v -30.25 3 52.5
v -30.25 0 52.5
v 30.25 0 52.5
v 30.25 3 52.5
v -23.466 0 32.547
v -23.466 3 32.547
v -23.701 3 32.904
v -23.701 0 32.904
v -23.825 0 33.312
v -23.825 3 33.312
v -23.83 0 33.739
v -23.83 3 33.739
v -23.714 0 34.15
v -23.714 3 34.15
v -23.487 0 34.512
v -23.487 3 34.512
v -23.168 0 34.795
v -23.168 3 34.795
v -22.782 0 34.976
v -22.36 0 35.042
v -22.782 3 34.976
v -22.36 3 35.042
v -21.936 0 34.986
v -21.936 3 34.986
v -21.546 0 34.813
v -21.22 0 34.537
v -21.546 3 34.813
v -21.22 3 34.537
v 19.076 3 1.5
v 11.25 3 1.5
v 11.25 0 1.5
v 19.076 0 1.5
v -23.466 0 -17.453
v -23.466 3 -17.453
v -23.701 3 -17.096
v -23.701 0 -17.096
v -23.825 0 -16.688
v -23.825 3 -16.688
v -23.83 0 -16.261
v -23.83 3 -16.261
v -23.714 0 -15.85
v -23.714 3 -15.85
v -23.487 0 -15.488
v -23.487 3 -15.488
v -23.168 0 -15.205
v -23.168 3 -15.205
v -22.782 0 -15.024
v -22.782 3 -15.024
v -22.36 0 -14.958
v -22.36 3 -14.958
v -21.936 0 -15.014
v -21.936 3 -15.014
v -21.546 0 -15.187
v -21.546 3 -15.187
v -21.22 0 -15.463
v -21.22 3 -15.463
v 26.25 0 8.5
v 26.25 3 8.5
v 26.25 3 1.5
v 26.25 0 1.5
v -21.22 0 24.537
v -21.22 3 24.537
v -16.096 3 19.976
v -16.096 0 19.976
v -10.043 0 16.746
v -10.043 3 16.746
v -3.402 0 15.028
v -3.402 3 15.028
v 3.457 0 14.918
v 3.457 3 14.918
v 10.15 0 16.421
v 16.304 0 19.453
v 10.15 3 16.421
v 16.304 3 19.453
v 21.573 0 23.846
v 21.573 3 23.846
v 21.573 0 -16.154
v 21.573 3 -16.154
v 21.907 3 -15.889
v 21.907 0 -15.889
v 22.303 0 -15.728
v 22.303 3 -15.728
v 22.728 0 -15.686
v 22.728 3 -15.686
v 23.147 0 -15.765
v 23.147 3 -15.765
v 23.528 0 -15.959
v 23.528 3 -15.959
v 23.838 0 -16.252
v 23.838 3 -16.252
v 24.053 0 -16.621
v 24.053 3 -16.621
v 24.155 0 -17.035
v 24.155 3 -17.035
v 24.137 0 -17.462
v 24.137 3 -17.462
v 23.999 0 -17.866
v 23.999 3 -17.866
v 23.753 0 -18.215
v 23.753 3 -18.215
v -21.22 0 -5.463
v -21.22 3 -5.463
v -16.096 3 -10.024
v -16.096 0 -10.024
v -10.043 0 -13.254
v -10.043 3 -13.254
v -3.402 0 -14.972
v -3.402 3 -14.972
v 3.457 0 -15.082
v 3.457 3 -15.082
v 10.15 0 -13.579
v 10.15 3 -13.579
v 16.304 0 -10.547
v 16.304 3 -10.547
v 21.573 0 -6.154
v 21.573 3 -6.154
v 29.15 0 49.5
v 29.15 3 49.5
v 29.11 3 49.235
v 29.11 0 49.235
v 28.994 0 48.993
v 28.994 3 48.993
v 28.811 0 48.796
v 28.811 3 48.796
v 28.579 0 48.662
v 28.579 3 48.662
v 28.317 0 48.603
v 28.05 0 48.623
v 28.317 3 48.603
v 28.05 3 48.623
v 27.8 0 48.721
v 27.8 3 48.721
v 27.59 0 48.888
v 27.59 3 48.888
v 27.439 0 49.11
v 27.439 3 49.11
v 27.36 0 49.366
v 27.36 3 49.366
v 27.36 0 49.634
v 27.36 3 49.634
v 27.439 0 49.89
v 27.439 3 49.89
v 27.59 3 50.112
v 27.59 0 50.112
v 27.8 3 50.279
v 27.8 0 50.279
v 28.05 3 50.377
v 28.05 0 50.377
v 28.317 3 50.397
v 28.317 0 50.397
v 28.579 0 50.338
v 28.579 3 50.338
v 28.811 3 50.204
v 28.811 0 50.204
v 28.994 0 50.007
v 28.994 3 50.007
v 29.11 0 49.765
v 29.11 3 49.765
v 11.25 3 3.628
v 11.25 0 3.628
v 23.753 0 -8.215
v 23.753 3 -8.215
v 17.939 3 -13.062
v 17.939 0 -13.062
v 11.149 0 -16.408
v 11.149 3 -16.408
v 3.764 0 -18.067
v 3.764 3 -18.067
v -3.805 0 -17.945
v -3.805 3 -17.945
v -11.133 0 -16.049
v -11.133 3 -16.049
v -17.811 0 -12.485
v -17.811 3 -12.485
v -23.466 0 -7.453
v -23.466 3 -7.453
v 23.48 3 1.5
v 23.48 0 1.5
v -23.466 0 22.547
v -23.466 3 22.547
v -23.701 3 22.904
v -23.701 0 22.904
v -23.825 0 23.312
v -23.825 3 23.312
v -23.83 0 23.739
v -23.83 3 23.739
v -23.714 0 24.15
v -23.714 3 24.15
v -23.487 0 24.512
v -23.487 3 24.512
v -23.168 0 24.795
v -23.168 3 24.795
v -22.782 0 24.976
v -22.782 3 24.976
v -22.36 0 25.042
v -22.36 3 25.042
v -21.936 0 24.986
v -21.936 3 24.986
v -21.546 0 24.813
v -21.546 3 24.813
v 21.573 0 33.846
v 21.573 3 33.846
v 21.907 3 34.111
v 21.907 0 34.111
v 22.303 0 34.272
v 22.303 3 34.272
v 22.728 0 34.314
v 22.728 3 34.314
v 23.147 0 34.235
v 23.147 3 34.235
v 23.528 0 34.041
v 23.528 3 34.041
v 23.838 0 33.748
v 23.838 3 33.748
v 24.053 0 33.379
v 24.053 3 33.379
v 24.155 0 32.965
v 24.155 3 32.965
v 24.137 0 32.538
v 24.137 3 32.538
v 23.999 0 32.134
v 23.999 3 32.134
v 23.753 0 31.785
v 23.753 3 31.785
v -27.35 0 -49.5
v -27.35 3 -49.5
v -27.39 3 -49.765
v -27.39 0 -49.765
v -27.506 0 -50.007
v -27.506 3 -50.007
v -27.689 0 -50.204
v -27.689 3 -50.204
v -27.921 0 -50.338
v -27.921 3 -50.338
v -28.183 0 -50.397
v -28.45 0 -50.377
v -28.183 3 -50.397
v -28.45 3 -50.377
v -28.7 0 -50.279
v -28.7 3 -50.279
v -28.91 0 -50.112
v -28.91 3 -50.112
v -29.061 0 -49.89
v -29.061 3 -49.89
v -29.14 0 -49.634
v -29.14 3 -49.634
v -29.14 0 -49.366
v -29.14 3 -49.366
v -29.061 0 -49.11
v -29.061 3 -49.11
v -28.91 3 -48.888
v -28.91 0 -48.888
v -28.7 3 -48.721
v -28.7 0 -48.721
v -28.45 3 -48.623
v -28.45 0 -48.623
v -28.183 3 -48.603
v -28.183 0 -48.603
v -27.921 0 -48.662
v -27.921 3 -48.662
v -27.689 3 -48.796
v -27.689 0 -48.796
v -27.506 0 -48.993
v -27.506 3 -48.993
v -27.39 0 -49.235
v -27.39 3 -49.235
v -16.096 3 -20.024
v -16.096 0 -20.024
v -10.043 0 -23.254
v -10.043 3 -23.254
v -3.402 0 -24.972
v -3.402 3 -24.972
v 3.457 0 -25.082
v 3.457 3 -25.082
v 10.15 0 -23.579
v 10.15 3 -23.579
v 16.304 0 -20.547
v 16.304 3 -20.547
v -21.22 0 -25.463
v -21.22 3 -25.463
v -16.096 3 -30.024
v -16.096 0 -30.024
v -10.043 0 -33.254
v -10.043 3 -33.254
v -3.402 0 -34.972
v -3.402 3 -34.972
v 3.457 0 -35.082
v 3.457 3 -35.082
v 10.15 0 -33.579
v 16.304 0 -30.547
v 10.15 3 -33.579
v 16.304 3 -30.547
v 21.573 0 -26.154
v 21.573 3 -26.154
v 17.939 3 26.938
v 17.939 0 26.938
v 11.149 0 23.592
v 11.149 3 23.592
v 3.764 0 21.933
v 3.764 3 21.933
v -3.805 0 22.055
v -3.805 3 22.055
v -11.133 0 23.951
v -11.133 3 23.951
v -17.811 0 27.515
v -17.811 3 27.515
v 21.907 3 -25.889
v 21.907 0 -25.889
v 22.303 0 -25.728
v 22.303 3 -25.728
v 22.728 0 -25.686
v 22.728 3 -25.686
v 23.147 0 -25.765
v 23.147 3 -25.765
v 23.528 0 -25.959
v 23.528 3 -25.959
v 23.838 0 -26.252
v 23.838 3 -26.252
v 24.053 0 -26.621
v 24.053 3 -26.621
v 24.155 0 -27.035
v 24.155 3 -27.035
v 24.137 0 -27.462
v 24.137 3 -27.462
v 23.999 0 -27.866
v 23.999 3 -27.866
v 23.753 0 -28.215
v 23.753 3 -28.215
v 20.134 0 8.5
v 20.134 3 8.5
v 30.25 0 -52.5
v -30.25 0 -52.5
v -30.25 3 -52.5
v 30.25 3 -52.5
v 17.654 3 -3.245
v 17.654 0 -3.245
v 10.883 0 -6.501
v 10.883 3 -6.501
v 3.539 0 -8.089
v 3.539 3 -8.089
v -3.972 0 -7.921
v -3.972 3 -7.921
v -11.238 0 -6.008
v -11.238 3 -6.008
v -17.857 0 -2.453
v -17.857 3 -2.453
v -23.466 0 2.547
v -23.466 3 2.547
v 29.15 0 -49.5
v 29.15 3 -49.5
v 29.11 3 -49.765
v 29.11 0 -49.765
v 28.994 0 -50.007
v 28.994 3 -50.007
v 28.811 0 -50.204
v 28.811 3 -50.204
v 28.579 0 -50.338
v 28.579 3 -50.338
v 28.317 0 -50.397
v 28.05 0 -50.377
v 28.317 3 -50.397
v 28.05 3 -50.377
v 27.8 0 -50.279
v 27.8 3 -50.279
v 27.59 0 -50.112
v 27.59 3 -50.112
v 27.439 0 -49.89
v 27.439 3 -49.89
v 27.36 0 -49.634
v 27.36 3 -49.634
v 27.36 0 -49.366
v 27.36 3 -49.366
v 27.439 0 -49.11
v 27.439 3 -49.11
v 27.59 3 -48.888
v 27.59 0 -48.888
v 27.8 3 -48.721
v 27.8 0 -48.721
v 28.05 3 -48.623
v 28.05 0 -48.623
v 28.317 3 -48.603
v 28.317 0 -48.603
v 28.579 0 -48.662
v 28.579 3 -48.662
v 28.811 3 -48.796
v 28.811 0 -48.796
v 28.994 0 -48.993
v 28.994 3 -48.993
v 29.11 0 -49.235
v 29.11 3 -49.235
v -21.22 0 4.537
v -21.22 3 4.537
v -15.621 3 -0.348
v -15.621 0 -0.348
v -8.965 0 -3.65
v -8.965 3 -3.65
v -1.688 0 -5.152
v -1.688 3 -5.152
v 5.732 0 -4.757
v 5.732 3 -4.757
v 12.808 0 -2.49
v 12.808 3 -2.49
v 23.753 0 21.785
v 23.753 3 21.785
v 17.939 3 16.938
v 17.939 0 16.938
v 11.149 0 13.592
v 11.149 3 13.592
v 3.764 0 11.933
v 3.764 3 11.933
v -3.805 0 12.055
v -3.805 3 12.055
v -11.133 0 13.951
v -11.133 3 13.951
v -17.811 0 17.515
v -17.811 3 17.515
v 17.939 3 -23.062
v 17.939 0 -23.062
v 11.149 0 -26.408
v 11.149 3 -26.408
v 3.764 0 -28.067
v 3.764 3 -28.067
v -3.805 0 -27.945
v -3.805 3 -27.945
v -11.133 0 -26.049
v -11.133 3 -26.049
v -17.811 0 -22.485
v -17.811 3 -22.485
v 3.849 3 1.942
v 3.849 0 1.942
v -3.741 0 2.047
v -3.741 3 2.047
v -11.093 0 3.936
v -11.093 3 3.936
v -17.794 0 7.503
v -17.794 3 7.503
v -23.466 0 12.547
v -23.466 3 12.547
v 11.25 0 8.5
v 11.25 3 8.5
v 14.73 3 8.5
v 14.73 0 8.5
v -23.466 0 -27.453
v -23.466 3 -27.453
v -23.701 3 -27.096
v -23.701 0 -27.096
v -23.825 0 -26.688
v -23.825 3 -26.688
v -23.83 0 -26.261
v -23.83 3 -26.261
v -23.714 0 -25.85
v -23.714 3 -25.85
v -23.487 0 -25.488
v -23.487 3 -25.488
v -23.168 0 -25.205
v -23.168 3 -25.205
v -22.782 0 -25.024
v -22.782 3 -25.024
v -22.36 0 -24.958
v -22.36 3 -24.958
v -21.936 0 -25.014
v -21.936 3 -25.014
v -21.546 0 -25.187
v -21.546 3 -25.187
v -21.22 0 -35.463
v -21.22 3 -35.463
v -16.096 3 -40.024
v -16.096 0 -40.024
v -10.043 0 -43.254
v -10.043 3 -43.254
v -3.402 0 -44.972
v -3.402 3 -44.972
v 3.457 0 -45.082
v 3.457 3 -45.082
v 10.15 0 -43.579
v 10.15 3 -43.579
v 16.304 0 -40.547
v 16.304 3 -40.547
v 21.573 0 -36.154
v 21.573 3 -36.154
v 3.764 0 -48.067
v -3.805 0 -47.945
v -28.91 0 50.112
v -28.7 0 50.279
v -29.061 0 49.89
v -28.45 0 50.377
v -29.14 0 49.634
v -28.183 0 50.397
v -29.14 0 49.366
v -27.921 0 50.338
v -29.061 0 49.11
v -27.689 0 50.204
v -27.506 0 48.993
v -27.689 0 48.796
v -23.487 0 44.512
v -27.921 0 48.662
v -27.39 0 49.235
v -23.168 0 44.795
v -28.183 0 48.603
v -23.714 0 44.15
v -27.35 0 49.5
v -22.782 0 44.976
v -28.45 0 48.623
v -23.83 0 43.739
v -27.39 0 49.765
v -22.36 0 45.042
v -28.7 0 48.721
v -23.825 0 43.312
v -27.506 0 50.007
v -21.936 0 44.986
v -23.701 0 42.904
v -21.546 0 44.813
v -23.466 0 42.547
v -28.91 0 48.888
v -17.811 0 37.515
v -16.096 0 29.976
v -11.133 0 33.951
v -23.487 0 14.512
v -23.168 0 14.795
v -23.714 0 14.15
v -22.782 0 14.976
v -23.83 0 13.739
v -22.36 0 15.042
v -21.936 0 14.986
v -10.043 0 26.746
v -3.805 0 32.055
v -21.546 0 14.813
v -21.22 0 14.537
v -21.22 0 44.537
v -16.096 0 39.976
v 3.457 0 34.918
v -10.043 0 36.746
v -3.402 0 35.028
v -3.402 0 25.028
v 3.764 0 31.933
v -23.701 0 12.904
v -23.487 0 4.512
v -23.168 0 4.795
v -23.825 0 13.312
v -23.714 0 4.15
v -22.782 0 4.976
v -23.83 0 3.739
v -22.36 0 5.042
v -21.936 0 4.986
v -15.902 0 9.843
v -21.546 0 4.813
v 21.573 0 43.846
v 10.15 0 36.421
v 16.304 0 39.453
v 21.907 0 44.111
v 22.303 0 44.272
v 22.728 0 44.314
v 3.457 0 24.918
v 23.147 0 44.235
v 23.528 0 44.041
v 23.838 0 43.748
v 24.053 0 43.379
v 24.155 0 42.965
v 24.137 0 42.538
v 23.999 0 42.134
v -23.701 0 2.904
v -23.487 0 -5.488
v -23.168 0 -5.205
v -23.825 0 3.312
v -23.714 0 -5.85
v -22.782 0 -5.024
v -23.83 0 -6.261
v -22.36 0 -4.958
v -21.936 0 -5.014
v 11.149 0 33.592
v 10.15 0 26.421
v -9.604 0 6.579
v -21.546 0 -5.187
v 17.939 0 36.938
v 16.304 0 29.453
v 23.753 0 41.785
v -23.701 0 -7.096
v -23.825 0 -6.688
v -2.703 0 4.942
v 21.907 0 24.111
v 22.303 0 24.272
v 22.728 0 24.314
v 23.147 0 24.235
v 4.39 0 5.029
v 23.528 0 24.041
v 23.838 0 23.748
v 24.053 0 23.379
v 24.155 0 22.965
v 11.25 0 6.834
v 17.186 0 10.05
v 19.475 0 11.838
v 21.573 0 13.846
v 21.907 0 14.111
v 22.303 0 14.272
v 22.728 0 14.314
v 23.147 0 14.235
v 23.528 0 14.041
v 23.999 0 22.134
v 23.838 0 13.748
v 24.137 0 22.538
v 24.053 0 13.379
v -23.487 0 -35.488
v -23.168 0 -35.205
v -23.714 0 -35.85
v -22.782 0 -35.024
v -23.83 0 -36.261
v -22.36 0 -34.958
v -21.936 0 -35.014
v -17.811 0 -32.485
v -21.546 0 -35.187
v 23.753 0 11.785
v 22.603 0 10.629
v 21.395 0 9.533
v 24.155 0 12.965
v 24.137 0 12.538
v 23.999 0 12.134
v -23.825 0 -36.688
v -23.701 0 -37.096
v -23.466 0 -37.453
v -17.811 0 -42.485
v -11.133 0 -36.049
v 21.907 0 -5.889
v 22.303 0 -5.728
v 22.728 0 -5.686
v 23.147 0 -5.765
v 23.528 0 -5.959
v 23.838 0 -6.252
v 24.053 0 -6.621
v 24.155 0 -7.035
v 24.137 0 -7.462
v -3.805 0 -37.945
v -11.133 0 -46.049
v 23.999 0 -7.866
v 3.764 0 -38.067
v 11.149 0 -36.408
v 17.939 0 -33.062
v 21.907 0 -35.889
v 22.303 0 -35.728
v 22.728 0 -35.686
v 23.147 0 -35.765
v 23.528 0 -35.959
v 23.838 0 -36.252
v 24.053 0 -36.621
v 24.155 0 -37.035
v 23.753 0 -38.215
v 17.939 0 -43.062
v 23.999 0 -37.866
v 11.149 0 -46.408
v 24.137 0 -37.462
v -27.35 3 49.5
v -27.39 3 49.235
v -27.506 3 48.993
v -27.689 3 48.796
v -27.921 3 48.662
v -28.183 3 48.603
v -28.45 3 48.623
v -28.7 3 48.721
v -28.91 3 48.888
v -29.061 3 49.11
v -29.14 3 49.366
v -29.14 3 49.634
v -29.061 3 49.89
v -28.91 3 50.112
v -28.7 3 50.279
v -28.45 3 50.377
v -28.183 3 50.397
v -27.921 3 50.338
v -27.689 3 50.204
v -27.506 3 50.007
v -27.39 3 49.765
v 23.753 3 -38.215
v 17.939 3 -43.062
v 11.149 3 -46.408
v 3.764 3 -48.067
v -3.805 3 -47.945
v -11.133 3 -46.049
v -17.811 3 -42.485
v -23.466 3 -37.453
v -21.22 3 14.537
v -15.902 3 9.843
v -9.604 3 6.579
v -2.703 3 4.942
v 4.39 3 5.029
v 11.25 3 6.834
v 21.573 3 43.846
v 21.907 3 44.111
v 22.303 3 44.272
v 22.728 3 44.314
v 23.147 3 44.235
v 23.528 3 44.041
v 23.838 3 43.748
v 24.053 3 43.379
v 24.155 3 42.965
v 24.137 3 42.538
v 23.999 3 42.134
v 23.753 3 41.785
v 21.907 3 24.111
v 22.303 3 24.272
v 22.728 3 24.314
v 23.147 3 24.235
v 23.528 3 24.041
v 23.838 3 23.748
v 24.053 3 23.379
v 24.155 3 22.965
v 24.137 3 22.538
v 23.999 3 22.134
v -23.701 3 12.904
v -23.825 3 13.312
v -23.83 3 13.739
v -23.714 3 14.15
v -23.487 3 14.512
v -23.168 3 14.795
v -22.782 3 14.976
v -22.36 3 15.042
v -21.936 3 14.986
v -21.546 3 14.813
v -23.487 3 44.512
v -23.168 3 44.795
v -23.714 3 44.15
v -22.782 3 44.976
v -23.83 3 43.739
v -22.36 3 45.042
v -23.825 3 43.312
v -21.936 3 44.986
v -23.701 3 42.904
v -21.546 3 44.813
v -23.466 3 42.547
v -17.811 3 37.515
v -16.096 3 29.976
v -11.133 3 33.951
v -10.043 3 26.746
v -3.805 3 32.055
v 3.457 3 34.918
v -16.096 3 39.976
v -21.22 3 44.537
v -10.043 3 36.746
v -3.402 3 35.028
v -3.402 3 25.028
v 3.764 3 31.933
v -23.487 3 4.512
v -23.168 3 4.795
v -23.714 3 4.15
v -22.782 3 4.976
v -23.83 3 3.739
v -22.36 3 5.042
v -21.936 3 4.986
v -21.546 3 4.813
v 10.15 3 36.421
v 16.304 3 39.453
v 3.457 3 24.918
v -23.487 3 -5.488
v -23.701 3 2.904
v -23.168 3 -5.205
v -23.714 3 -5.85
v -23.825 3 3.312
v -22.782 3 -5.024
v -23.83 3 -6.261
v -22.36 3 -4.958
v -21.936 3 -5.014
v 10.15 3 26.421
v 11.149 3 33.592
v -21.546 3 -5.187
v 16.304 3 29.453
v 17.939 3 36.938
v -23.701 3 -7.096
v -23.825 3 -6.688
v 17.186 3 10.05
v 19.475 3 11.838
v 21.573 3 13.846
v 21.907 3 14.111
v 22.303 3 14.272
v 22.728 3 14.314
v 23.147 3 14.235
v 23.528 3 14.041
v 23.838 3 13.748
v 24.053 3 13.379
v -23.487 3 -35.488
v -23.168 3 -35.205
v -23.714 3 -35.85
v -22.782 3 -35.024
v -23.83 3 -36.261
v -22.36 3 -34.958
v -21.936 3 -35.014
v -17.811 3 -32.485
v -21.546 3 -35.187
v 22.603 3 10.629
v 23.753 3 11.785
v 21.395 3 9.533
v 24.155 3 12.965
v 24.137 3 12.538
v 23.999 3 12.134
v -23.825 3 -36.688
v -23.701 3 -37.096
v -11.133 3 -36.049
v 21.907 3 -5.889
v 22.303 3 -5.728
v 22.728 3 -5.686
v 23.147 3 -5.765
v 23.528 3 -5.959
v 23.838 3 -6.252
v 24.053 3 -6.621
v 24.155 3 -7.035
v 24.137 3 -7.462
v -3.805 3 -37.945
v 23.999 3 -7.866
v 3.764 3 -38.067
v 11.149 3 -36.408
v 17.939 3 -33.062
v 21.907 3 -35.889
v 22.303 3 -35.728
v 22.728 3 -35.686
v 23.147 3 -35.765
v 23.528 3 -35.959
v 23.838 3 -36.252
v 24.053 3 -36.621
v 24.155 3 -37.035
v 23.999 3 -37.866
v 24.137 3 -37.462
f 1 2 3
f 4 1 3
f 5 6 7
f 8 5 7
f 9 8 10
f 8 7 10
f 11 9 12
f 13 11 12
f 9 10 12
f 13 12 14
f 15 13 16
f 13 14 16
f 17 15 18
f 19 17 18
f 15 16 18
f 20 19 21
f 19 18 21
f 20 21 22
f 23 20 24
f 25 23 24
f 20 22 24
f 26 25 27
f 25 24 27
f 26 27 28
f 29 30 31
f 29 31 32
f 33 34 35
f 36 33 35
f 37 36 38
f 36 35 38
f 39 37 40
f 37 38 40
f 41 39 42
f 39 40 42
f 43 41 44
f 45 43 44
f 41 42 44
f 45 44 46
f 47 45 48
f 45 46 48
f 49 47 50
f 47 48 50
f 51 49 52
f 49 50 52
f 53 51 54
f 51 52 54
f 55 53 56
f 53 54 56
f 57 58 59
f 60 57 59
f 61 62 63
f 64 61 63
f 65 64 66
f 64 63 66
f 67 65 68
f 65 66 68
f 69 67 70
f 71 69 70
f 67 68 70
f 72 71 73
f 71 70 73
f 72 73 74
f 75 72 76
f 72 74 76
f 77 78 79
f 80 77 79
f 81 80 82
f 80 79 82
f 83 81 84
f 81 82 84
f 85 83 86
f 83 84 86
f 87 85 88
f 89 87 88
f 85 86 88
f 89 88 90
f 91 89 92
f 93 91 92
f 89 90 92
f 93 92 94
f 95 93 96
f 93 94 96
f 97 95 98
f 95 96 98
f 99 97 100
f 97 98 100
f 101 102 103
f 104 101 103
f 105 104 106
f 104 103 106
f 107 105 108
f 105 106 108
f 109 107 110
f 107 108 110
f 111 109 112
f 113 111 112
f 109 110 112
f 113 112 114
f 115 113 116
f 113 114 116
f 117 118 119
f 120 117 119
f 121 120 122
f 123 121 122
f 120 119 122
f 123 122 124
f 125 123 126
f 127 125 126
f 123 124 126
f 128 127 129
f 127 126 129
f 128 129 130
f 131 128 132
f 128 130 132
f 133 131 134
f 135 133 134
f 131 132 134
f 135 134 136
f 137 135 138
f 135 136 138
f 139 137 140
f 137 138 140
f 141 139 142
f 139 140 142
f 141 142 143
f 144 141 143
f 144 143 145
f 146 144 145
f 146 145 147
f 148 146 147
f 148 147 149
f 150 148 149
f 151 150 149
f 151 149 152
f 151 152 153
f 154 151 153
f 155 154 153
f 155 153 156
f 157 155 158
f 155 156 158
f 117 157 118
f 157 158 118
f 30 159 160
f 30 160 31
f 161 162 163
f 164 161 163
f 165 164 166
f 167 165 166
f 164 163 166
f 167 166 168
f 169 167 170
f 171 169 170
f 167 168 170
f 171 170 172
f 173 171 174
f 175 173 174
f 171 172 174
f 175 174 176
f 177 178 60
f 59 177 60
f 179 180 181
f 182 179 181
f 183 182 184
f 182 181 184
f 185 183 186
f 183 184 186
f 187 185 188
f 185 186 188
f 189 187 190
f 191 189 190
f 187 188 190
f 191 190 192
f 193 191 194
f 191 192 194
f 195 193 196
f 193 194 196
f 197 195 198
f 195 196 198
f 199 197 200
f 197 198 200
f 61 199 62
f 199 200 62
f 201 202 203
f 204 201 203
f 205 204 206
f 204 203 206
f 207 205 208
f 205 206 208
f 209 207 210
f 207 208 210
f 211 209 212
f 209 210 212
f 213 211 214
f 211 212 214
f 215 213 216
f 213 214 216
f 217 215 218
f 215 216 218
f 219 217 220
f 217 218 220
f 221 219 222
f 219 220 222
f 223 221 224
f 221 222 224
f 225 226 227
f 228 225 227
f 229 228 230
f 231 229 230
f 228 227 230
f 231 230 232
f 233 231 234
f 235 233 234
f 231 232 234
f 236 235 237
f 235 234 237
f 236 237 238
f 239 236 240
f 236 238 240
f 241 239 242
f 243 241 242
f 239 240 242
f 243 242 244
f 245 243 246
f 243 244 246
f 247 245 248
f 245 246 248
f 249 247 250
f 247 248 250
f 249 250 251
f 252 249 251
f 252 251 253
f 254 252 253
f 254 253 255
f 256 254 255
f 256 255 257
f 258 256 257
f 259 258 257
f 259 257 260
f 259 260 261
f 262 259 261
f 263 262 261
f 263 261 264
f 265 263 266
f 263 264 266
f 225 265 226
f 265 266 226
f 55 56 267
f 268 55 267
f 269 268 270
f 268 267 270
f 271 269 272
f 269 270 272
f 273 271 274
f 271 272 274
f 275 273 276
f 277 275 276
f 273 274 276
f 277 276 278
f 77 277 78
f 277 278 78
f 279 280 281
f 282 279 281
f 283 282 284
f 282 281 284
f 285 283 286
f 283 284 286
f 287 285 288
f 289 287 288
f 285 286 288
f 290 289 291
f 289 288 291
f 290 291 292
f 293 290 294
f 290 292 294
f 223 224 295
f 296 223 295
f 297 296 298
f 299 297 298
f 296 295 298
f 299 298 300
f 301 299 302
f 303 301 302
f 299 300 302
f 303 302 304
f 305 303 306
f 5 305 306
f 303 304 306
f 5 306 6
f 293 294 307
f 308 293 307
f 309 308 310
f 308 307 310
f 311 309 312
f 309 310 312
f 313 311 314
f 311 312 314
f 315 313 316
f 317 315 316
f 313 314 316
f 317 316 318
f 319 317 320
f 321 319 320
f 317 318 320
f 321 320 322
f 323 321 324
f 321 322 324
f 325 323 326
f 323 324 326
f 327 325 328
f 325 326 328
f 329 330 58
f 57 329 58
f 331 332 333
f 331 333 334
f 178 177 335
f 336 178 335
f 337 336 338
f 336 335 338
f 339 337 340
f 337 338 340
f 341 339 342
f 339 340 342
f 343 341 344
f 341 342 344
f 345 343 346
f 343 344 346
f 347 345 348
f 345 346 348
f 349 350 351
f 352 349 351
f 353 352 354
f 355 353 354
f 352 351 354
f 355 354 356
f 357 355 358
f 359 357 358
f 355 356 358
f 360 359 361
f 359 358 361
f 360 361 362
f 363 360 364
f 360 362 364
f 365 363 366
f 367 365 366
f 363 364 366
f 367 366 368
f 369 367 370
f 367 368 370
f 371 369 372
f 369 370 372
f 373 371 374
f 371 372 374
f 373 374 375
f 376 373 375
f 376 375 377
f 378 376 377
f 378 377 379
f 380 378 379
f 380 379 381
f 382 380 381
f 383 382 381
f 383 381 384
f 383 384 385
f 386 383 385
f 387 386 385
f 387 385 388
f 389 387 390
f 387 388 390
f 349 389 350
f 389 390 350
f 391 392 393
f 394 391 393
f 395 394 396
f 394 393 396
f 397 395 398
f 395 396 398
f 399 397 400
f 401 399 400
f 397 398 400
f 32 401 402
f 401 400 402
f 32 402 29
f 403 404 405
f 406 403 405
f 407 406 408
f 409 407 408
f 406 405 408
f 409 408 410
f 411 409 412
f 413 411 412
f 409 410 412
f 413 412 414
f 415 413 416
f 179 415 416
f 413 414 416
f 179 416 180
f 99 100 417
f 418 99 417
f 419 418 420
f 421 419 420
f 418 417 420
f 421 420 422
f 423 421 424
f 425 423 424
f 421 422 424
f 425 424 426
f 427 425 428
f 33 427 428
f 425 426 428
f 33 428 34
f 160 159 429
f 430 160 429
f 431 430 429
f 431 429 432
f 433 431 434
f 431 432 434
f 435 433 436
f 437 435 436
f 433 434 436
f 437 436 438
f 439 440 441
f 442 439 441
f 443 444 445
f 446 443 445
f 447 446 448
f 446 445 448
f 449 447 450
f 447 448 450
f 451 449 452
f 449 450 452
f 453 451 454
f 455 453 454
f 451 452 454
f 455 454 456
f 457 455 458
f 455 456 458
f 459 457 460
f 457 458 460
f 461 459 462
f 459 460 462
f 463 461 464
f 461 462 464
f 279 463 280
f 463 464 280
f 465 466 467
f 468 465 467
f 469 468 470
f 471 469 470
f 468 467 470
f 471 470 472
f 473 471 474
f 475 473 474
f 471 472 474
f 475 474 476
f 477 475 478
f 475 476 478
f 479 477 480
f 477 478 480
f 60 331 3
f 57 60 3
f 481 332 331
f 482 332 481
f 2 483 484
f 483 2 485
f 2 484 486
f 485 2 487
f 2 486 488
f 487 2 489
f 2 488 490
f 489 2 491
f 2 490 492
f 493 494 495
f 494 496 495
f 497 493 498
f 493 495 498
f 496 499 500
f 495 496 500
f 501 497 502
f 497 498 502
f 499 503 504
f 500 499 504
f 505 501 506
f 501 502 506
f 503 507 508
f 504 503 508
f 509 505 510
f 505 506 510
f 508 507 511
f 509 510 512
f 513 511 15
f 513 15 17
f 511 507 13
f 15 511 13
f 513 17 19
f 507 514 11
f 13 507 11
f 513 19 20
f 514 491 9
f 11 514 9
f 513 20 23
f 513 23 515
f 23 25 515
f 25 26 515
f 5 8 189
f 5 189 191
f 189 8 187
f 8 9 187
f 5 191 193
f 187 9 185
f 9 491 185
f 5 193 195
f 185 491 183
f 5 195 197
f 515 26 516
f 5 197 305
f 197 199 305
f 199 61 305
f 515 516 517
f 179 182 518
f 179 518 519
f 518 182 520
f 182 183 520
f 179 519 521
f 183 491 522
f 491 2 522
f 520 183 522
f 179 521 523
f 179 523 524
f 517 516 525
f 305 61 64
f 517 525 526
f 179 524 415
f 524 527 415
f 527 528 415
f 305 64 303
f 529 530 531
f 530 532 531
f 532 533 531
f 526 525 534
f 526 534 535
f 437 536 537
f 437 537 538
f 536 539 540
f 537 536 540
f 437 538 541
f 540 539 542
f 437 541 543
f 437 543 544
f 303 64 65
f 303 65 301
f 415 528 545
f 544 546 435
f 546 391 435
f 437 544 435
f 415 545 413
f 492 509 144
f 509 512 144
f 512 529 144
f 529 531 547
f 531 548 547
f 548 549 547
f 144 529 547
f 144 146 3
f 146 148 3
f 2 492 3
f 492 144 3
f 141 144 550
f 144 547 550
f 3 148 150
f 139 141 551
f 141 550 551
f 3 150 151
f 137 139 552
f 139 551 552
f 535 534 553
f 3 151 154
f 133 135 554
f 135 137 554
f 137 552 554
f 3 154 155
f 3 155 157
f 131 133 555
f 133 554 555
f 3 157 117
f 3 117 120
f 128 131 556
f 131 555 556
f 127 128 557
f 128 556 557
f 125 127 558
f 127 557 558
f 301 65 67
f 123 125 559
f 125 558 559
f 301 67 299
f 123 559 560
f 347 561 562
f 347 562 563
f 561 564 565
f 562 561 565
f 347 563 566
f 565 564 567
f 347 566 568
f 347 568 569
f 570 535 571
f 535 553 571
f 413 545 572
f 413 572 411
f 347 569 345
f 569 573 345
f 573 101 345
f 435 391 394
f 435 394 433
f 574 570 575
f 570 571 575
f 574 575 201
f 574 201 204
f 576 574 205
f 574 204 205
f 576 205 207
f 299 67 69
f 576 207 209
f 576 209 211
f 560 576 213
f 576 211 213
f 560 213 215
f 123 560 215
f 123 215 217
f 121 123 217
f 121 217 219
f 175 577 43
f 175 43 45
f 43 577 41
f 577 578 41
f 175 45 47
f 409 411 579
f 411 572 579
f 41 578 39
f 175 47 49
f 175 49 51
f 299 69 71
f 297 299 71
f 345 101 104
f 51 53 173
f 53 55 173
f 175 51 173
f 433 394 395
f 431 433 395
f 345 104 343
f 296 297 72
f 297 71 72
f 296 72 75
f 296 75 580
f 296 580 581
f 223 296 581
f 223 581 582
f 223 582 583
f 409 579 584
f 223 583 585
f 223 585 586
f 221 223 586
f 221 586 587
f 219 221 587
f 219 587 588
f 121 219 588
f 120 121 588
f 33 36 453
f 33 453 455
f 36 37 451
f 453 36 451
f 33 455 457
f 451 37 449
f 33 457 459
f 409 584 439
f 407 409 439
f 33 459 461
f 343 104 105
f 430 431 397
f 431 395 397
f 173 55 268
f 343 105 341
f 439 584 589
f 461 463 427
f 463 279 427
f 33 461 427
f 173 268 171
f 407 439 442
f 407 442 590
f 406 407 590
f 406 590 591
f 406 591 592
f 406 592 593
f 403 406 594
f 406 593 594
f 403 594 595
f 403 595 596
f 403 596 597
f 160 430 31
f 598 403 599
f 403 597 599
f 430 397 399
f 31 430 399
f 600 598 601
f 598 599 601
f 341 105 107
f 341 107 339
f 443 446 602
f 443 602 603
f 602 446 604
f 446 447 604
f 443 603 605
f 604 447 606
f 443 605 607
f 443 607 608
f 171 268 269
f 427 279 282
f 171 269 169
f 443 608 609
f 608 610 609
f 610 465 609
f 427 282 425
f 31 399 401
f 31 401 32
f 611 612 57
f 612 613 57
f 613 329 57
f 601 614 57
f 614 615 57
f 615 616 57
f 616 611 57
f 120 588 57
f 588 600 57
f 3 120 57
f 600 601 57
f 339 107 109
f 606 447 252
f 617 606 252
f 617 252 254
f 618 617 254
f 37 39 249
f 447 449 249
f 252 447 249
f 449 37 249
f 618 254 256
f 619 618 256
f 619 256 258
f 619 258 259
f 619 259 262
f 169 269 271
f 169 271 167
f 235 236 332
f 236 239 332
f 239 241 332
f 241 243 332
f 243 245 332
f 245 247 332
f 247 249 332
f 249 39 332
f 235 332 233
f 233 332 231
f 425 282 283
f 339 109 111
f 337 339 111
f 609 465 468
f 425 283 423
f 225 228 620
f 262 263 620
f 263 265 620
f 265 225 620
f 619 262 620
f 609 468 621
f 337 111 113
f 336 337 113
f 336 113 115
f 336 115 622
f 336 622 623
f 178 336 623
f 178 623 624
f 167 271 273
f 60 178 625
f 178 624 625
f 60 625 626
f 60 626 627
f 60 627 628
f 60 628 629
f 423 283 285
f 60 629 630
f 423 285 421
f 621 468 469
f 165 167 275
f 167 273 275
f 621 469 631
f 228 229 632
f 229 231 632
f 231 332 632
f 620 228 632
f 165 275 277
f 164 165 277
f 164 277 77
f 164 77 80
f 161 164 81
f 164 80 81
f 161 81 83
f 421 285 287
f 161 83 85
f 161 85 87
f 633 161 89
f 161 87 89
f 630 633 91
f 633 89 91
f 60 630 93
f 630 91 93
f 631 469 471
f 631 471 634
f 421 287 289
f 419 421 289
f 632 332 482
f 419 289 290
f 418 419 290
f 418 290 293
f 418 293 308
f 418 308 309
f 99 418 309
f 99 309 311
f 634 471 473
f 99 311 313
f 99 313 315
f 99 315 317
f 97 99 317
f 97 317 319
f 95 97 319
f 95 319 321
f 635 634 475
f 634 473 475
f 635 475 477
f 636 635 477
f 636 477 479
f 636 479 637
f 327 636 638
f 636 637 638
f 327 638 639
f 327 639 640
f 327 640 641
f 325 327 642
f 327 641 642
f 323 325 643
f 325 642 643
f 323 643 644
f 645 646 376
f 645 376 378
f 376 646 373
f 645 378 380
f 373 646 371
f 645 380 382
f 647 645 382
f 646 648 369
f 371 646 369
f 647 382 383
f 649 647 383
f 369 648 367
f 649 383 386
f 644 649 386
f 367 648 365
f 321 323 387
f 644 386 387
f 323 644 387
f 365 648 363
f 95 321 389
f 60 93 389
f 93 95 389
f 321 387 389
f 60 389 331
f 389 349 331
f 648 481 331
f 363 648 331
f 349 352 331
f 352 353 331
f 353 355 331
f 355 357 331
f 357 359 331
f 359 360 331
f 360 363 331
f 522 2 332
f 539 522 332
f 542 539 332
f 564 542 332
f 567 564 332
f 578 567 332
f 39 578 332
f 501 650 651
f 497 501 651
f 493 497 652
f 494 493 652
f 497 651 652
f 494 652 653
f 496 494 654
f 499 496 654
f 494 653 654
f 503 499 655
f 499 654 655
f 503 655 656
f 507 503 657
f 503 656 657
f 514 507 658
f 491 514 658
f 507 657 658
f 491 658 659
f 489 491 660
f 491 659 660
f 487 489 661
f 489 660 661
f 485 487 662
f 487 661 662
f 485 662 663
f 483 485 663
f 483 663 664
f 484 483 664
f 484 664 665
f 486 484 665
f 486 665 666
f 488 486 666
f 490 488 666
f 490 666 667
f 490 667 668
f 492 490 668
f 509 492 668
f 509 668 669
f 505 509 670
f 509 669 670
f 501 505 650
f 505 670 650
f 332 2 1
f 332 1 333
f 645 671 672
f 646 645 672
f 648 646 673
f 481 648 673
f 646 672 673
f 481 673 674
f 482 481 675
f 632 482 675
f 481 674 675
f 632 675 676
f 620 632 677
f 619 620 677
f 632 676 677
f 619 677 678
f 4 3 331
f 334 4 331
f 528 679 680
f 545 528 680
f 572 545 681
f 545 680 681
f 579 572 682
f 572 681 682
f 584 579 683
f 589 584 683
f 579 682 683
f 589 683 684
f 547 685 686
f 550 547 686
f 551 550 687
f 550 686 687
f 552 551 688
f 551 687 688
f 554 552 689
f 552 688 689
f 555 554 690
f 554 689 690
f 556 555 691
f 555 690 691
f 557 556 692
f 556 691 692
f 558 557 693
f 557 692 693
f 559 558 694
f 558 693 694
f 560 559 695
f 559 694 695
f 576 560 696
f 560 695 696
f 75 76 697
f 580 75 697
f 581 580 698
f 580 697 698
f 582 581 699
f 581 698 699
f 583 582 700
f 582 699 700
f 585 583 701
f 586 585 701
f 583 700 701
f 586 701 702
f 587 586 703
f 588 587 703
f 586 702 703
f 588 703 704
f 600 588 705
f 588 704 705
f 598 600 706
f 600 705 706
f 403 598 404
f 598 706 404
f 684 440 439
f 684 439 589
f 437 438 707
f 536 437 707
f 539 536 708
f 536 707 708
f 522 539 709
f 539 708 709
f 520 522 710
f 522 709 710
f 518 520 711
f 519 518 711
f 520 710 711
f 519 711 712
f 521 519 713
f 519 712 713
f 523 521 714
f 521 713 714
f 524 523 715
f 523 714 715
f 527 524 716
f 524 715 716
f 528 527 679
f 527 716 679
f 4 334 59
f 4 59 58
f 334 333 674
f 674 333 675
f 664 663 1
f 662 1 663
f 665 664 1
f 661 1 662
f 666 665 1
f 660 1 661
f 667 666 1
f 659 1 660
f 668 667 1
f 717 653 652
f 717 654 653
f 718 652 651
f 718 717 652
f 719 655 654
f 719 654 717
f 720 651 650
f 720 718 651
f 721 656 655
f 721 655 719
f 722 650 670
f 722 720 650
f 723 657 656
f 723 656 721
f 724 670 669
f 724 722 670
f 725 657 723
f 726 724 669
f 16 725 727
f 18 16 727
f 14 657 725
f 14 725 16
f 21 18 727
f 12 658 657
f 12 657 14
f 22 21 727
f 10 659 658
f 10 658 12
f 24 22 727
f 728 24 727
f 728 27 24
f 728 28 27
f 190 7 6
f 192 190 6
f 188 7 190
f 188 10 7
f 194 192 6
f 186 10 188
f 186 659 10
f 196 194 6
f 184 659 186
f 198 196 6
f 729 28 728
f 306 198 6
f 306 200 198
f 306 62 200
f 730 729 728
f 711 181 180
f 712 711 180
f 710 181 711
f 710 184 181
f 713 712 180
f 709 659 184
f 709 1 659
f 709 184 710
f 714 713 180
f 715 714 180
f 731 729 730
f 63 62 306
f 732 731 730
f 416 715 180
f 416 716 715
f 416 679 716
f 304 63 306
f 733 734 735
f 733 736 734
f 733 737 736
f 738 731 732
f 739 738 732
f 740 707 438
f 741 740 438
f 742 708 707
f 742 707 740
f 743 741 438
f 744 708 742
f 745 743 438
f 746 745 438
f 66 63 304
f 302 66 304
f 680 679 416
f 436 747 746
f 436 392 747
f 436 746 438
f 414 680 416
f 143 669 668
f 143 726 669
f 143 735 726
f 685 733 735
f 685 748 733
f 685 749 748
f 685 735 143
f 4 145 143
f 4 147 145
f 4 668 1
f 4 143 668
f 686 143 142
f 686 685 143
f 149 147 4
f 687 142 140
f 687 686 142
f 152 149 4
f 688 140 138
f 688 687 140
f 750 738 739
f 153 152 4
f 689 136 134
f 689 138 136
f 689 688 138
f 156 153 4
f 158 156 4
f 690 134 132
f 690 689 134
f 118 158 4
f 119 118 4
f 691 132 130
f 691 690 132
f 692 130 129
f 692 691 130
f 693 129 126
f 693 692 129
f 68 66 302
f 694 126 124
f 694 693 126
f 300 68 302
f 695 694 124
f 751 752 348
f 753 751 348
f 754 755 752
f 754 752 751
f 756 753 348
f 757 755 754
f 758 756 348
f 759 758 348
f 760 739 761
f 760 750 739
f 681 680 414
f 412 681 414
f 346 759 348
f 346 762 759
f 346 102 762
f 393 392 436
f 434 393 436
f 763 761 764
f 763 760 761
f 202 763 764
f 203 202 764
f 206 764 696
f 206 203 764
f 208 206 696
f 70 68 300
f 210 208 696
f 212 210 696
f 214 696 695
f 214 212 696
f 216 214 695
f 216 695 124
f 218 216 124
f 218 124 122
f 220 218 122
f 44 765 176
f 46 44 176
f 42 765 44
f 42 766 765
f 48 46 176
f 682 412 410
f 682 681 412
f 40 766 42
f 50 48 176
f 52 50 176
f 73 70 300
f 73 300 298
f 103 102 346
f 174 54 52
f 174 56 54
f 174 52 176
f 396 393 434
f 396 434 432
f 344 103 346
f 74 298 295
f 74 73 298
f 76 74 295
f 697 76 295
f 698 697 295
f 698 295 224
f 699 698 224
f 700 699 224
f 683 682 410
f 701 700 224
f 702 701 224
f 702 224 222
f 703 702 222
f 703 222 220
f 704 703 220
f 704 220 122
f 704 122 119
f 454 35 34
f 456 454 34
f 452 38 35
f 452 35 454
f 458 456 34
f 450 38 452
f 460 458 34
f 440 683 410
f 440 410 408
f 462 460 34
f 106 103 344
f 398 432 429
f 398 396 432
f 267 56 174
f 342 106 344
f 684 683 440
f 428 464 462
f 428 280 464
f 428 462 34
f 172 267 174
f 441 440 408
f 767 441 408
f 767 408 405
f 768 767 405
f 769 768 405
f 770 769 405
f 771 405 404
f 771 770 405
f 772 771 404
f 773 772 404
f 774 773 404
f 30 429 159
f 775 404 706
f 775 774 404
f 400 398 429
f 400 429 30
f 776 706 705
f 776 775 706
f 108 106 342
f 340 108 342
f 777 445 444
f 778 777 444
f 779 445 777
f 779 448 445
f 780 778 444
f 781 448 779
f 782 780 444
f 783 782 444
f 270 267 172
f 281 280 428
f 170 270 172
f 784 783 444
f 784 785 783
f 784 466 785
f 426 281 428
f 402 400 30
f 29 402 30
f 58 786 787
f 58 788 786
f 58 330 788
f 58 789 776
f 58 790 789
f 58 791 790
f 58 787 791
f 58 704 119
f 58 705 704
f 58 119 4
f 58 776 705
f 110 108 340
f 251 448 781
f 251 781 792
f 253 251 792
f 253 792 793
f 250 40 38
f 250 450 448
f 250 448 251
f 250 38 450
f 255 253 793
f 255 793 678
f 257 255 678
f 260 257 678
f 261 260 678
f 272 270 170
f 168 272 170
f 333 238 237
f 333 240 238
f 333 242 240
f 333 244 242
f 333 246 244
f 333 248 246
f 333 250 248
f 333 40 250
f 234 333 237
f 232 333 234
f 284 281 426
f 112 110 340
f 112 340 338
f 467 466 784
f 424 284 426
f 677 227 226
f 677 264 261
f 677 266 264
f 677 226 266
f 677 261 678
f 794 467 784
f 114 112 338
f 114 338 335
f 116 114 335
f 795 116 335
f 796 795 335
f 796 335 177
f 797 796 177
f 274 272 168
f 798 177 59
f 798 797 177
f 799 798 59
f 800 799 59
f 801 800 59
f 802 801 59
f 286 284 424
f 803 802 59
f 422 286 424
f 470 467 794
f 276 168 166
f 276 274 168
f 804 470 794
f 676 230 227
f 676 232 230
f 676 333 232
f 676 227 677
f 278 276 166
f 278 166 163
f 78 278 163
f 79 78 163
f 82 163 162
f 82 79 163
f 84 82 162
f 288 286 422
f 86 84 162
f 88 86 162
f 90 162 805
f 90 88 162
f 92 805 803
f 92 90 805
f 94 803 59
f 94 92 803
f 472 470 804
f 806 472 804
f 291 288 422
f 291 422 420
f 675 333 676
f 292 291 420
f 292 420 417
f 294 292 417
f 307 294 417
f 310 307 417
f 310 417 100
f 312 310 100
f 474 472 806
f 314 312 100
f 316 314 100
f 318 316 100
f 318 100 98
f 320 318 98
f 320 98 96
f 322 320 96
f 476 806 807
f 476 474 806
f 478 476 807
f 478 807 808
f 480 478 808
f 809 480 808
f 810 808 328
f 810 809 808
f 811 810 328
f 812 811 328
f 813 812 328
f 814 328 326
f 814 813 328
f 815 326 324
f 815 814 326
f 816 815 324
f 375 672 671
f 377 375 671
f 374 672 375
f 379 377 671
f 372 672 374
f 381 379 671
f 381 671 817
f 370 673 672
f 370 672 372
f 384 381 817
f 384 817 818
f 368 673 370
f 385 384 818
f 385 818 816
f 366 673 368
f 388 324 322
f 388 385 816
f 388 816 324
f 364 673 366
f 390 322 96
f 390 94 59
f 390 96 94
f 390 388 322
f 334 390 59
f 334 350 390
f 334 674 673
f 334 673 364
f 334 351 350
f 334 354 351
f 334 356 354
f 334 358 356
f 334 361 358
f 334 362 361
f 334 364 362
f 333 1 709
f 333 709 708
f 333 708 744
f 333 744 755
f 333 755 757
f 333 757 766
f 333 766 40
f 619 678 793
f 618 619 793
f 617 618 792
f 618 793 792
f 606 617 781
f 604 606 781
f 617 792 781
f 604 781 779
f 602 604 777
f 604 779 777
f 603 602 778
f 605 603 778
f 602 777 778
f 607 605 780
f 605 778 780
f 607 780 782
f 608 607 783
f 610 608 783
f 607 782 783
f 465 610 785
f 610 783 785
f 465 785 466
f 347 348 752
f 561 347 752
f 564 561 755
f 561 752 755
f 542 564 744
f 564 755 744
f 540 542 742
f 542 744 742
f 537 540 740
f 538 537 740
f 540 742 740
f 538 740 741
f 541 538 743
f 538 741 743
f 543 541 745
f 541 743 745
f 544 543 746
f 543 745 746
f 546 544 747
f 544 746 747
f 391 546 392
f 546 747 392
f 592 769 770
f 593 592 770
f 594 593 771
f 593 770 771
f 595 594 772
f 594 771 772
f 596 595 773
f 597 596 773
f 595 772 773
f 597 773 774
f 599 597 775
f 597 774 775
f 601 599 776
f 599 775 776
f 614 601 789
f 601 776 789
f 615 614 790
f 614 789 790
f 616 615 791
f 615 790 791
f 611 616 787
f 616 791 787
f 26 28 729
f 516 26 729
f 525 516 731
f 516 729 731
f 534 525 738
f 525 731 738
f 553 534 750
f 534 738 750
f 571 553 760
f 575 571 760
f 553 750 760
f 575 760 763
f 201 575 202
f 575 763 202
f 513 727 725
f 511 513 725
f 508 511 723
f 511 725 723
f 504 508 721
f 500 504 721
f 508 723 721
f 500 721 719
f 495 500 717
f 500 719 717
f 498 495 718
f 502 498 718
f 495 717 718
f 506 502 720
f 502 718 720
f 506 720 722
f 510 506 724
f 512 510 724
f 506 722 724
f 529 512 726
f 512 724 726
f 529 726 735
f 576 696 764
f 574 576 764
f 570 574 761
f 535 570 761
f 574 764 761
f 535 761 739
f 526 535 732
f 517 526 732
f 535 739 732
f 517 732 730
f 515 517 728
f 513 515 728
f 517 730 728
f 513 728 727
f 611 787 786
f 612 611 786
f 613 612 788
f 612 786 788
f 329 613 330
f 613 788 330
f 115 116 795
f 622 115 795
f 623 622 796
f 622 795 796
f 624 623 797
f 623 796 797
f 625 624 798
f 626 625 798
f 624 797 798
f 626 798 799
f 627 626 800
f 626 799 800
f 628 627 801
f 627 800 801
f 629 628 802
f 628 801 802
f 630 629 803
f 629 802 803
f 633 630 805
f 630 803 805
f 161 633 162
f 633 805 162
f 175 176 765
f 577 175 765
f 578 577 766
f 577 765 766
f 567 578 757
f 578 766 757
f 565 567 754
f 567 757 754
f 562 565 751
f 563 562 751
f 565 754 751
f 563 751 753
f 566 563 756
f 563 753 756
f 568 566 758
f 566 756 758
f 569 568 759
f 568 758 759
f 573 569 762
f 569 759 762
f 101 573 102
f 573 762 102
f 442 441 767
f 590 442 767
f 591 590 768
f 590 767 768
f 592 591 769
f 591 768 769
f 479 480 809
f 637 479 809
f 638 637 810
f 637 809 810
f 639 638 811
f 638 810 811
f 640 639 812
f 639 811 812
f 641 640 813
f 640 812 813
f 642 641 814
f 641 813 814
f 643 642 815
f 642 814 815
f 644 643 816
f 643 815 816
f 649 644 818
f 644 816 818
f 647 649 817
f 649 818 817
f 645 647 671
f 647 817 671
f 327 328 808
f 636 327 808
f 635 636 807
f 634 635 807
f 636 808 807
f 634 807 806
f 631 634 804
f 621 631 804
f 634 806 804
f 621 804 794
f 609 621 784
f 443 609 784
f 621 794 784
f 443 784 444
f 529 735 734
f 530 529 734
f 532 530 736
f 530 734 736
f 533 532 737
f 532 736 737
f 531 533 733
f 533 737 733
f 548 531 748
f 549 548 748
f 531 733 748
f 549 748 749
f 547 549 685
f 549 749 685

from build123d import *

# Parameters (mm, degrees)
SKETCH1_W           = 60.5
SKETCH1_H           = 105
BOSS_EXTRUDE1_DEPTH = 3
SKETCH2_R           = 0.9
CUT_EXTRUDE1_DEPTH  = 3
SKETCH4_R           = 0.9
CUT_EXTRUDE2_DEPTH  = 3
SKETCH5_W           = 15
SKETCH5_H           = 7
CUT_EXTRUDE3_DEPTH  = 3
CUT_EXTRUDE4_DEPTH  = 3


with BuildPart() as part:
    # Sketch1 → Boss-Extrude1 (new body)
    with BuildSketch(Plane(origin=(0, 0, 0), x_dir=(1, 0, 0), z_dir=(0, 1, 0))):
        Rectangle(SKETCH1_W, SKETCH1_H)
    extrude(amount=BOSS_EXTRUDE1_DEPTH)

    # Sketch2 → Cut-Extrude1 (cut)
    with BuildSketch(Plane(origin=(0, 3, 0), x_dir=(1, 0, 0), z_dir=(0, 1, 0))):
        with Locations((-28.25, 49.5)):
            Circle(SKETCH2_R)
        with Locations((28.25, 49.5)):
            Circle(SKETCH2_R)
    extrude(amount=-CUT_EXTRUDE1_DEPTH, mode=Mode.SUBTRACT)

    # Sketch4 → Cut-Extrude2 (cut)
    with BuildSketch(Plane(origin=(0, 3, 0), x_dir=(1, 0, 0), z_dir=(0, 1, 0))):
        with Locations((-28.25, -49.5)):
            Circle(SKETCH4_R)
        with Locations((28.25, -49.5)):
            Circle(SKETCH4_R)
    extrude(amount=-CUT_EXTRUDE2_DEPTH, mode=Mode.SUBTRACT)

    # Sketch5 → Cut-Extrude3 (cut)
    with BuildSketch(Plane(origin=(0, 3, 0), x_dir=(1, 0, 0), z_dir=(0, 1, 0))):
        with Locations((18.75, -5)):
            Rectangle(SKETCH5_W, SKETCH5_H)
    extrude(amount=-CUT_EXTRUDE3_DEPTH, mode=Mode.SUBTRACT)

    # Sketch6 → Cut-Extrude4 (cut)
    with BuildSketch(Plane(origin=(0, 3, 0), x_dir=(1, 0, 0), z_dir=(0, 1, 0))):
        with BuildLine():
            ThreePointArc((23.75286773, 38.214829885), (-0.024201003, 48.23018139), (-23.465757765, 37.452905298))
            ThreePointArc((-23.465757765, 37.452905298), (-23.337849069, 35.335444704), (-21.220388476, 35.4633534))
            ThreePointArc((-21.220388476, 35.4633534), (0.024201003, 45.230571874), (21.572857921, 36.153869615))
            ThreePointArc((21.572857921, 36.153869615), (23.693342961, 36.094344845), (23.75286773, 38.214829885))
        make_face()
        with BuildLine():
            ThreePointArc((23.75286773, 28.214829885), (-0.024201003, 38.23018139), (-23.465757765, 27.452905298))
            ThreePointArc((-23.465757765, 27.452905298), (-23.337849069, 25.335444704), (-21.220388476, 25.4633534))
            ThreePointArc((-21.220388476, 25.4633534), (0.024201003, 35.230571874), (21.572857921, 26.153869615))
            ThreePointArc((21.572857921, 26.153869615), (23.693342961, 26.094344845), (23.75286773, 28.214829885))
        make_face()
        with BuildLine():
            ThreePointArc((23.75286773, 18.214829885), (-0.024201003, 28.23018139), (-23.465757765, 17.452905298))
            ThreePointArc((-23.465757765, 17.452905298), (-23.337849069, 15.335444704), (-21.220388476, 15.4633534))
            ThreePointArc((-21.220388476, 15.4633534), (0.024201003, 25.230571874), (21.572857921, 16.153869615))
            ThreePointArc((21.572857921, 16.153869615), (23.693342961, 16.094344845), (23.75286773, 18.214829885))
        make_face()
        with BuildLine():
            ThreePointArc((23.75286773, 8.214829885), (-0.024201003, 18.23018139), (-23.465757765, 7.452905298))
            ThreePointArc((-23.465757765, 7.452905298), (-23.337849069, 5.335444704), (-21.220388476, 5.4633534))
            ThreePointArc((-21.220388476, 5.4633534), (0.024201003, 15.230571874), (21.572857921, 6.153869615))
            ThreePointArc((21.572857921, 6.153869615), (23.693342961, 6.094344845), (23.75286773, 8.214829885))
        make_face()
        with BuildLine():
            ThreePointArc((23.75286773, -1.785170115), (-0.024201003, 8.23018139), (-23.465757765, -2.547094702))
            ThreePointArc((-23.465757765, -2.547094702), (-23.337849069, -4.664555296), (-21.220388476, -4.5366466))
            ThreePointArc((-21.220388476, -4.5366466), (0.024201003, 5.230571874), (21.572857921, -3.846130385))
            ThreePointArc((21.572857921, -3.846130385), (23.693342961, -3.905655155), (23.75286773, -1.785170115))
        make_face()
        with BuildLine():
            ThreePointArc((23.75286773, -11.785170115), (-0.024201003, -1.76981861), (-23.465757765, -12.547094702))
            ThreePointArc((-23.465757765, -12.547094702), (-23.337849069, -14.664555296), (-21.220388476, -14.5366466))
            ThreePointArc((-21.220388476, -14.5366466), (0.024201003, -4.769428126), (21.572857921, -13.846130385))
            ThreePointArc((21.572857921, -13.846130385), (23.693342961, -13.905655155), (23.75286773, -11.785170115))
        make_face()
        with BuildLine():
            ThreePointArc((23.75286773, -21.785170115), (-0.024201003, -11.76981861), (-23.465757765, -22.547094702))
            ThreePointArc((-23.465757765, -22.547094702), (-23.337849069, -24.664555296), (-21.220388476, -24.5366466))
            ThreePointArc((-21.220388476, -24.5366466), (0.024201003, -14.769428126), (21.572857921, -23.846130385))
            ThreePointArc((21.572857921, -23.846130385), (23.693342961, -23.905655155), (23.75286773, -21.785170115))
        make_face()
        with BuildLine():
            ThreePointArc((23.75286773, -31.785170115), (-0.024201003, -21.76981861), (-23.465757765, -32.547094702))
            ThreePointArc((-23.465757765, -32.547094702), (-23.337849069, -34.664555296), (-21.220388476, -34.5366466))
            ThreePointArc((-21.220388476, -34.5366466), (0.024201003, -24.769428126), (21.572857921, -33.846130385))
            ThreePointArc((21.572857921, -33.846130385), (23.693342961, -33.905655155), (23.75286773, -31.785170115))
        make_face()
        with BuildLine():
            ThreePointArc((23.75286773, -41.785170115), (-0.024201003, -31.76981861), (-23.465757765, -42.547094702))
            ThreePointArc((-23.465757765, -42.547094702), (-23.337849069, -44.664555296), (-21.220388476, -44.5366466))
            ThreePointArc((-21.220388476, -44.5366466), (0.024201003, -34.769428126), (21.572857921, -43.846130385))
            ThreePointArc((21.572857921, -43.846130385), (23.693342961, -43.905655155), (23.75286773, -41.785170115))
        make_face()
    extrude(amount=-CUT_EXTRUDE4_DEPTH, mode=Mode.SUBTRACT)


solid = part.part
